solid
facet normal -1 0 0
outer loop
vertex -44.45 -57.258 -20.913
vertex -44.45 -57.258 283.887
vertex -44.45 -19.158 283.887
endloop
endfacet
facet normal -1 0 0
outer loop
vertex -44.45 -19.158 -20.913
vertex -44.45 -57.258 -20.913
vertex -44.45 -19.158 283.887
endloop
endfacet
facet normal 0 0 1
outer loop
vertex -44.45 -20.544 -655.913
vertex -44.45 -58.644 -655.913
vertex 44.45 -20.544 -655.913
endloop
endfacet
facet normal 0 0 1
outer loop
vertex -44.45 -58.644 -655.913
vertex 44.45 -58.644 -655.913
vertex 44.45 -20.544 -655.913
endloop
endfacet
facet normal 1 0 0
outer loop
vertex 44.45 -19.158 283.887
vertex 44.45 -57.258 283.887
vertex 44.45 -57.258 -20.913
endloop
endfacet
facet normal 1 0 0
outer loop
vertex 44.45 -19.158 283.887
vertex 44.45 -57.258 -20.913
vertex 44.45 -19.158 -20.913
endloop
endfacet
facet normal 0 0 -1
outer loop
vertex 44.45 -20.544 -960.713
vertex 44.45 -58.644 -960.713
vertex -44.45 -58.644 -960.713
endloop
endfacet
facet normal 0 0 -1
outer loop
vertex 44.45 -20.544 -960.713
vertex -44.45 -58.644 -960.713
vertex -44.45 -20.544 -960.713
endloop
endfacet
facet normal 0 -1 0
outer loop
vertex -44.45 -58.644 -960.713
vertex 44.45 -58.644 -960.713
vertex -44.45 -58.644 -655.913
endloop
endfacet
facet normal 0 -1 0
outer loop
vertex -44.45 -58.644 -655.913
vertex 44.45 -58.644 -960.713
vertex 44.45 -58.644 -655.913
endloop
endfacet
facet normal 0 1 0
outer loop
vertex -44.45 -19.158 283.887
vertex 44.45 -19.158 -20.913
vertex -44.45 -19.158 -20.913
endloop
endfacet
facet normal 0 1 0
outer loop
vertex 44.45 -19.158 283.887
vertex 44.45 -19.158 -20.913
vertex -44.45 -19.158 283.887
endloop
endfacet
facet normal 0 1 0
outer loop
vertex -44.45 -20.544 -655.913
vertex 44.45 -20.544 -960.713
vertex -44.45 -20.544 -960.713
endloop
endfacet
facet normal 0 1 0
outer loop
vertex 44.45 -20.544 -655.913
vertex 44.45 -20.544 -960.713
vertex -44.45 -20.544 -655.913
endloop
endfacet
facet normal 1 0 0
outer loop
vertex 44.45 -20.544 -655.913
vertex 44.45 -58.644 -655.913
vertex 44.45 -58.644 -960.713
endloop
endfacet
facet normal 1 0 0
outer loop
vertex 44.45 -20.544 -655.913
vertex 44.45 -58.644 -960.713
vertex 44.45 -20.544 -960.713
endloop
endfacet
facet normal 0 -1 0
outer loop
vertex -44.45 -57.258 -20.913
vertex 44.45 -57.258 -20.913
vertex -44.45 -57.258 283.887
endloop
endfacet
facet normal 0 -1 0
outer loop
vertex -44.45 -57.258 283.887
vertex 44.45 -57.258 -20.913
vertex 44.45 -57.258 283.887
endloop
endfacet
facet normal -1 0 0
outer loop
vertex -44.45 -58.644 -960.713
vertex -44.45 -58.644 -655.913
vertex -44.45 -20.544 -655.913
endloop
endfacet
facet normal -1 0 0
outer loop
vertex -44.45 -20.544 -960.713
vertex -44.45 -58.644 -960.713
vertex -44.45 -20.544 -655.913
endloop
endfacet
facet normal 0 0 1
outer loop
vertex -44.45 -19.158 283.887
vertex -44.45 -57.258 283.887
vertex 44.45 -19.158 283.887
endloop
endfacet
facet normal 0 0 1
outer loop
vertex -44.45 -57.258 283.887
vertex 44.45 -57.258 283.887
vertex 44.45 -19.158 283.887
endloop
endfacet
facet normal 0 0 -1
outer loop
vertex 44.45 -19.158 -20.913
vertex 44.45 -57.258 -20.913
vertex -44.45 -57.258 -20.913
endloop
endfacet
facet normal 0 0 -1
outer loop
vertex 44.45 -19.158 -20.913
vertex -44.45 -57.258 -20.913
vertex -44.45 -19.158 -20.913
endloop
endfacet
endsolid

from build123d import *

# Parameters (mm, degrees)
F0_W     = 38.1
F0_H     = 304.8
F2_DEPTH = 44.45
F1_W     = 38.1
F1_H     = 304.8
F3_DEPTH = 44.45


with BuildPart() as f2:
    # F0 (on Right) → F2 (new body, symmetric)
    with BuildSketch(Plane.YZ):
        with Locations((-38.207637, 131.487306)):
            Rectangle(F0_W, F0_H)
    extrude(amount=F2_DEPTH, both=True)


with BuildPart() as f3:
    # F1 (on Right) → F3 (new body, symmetric)
    with BuildSketch(Plane.YZ):
        with Locations((-39.594454, -808.312694)):
            Rectangle(F1_W, F1_H)
    extrude(amount=F3_DEPTH, both=True)


solid = Compound([f2.part, f3.part])
